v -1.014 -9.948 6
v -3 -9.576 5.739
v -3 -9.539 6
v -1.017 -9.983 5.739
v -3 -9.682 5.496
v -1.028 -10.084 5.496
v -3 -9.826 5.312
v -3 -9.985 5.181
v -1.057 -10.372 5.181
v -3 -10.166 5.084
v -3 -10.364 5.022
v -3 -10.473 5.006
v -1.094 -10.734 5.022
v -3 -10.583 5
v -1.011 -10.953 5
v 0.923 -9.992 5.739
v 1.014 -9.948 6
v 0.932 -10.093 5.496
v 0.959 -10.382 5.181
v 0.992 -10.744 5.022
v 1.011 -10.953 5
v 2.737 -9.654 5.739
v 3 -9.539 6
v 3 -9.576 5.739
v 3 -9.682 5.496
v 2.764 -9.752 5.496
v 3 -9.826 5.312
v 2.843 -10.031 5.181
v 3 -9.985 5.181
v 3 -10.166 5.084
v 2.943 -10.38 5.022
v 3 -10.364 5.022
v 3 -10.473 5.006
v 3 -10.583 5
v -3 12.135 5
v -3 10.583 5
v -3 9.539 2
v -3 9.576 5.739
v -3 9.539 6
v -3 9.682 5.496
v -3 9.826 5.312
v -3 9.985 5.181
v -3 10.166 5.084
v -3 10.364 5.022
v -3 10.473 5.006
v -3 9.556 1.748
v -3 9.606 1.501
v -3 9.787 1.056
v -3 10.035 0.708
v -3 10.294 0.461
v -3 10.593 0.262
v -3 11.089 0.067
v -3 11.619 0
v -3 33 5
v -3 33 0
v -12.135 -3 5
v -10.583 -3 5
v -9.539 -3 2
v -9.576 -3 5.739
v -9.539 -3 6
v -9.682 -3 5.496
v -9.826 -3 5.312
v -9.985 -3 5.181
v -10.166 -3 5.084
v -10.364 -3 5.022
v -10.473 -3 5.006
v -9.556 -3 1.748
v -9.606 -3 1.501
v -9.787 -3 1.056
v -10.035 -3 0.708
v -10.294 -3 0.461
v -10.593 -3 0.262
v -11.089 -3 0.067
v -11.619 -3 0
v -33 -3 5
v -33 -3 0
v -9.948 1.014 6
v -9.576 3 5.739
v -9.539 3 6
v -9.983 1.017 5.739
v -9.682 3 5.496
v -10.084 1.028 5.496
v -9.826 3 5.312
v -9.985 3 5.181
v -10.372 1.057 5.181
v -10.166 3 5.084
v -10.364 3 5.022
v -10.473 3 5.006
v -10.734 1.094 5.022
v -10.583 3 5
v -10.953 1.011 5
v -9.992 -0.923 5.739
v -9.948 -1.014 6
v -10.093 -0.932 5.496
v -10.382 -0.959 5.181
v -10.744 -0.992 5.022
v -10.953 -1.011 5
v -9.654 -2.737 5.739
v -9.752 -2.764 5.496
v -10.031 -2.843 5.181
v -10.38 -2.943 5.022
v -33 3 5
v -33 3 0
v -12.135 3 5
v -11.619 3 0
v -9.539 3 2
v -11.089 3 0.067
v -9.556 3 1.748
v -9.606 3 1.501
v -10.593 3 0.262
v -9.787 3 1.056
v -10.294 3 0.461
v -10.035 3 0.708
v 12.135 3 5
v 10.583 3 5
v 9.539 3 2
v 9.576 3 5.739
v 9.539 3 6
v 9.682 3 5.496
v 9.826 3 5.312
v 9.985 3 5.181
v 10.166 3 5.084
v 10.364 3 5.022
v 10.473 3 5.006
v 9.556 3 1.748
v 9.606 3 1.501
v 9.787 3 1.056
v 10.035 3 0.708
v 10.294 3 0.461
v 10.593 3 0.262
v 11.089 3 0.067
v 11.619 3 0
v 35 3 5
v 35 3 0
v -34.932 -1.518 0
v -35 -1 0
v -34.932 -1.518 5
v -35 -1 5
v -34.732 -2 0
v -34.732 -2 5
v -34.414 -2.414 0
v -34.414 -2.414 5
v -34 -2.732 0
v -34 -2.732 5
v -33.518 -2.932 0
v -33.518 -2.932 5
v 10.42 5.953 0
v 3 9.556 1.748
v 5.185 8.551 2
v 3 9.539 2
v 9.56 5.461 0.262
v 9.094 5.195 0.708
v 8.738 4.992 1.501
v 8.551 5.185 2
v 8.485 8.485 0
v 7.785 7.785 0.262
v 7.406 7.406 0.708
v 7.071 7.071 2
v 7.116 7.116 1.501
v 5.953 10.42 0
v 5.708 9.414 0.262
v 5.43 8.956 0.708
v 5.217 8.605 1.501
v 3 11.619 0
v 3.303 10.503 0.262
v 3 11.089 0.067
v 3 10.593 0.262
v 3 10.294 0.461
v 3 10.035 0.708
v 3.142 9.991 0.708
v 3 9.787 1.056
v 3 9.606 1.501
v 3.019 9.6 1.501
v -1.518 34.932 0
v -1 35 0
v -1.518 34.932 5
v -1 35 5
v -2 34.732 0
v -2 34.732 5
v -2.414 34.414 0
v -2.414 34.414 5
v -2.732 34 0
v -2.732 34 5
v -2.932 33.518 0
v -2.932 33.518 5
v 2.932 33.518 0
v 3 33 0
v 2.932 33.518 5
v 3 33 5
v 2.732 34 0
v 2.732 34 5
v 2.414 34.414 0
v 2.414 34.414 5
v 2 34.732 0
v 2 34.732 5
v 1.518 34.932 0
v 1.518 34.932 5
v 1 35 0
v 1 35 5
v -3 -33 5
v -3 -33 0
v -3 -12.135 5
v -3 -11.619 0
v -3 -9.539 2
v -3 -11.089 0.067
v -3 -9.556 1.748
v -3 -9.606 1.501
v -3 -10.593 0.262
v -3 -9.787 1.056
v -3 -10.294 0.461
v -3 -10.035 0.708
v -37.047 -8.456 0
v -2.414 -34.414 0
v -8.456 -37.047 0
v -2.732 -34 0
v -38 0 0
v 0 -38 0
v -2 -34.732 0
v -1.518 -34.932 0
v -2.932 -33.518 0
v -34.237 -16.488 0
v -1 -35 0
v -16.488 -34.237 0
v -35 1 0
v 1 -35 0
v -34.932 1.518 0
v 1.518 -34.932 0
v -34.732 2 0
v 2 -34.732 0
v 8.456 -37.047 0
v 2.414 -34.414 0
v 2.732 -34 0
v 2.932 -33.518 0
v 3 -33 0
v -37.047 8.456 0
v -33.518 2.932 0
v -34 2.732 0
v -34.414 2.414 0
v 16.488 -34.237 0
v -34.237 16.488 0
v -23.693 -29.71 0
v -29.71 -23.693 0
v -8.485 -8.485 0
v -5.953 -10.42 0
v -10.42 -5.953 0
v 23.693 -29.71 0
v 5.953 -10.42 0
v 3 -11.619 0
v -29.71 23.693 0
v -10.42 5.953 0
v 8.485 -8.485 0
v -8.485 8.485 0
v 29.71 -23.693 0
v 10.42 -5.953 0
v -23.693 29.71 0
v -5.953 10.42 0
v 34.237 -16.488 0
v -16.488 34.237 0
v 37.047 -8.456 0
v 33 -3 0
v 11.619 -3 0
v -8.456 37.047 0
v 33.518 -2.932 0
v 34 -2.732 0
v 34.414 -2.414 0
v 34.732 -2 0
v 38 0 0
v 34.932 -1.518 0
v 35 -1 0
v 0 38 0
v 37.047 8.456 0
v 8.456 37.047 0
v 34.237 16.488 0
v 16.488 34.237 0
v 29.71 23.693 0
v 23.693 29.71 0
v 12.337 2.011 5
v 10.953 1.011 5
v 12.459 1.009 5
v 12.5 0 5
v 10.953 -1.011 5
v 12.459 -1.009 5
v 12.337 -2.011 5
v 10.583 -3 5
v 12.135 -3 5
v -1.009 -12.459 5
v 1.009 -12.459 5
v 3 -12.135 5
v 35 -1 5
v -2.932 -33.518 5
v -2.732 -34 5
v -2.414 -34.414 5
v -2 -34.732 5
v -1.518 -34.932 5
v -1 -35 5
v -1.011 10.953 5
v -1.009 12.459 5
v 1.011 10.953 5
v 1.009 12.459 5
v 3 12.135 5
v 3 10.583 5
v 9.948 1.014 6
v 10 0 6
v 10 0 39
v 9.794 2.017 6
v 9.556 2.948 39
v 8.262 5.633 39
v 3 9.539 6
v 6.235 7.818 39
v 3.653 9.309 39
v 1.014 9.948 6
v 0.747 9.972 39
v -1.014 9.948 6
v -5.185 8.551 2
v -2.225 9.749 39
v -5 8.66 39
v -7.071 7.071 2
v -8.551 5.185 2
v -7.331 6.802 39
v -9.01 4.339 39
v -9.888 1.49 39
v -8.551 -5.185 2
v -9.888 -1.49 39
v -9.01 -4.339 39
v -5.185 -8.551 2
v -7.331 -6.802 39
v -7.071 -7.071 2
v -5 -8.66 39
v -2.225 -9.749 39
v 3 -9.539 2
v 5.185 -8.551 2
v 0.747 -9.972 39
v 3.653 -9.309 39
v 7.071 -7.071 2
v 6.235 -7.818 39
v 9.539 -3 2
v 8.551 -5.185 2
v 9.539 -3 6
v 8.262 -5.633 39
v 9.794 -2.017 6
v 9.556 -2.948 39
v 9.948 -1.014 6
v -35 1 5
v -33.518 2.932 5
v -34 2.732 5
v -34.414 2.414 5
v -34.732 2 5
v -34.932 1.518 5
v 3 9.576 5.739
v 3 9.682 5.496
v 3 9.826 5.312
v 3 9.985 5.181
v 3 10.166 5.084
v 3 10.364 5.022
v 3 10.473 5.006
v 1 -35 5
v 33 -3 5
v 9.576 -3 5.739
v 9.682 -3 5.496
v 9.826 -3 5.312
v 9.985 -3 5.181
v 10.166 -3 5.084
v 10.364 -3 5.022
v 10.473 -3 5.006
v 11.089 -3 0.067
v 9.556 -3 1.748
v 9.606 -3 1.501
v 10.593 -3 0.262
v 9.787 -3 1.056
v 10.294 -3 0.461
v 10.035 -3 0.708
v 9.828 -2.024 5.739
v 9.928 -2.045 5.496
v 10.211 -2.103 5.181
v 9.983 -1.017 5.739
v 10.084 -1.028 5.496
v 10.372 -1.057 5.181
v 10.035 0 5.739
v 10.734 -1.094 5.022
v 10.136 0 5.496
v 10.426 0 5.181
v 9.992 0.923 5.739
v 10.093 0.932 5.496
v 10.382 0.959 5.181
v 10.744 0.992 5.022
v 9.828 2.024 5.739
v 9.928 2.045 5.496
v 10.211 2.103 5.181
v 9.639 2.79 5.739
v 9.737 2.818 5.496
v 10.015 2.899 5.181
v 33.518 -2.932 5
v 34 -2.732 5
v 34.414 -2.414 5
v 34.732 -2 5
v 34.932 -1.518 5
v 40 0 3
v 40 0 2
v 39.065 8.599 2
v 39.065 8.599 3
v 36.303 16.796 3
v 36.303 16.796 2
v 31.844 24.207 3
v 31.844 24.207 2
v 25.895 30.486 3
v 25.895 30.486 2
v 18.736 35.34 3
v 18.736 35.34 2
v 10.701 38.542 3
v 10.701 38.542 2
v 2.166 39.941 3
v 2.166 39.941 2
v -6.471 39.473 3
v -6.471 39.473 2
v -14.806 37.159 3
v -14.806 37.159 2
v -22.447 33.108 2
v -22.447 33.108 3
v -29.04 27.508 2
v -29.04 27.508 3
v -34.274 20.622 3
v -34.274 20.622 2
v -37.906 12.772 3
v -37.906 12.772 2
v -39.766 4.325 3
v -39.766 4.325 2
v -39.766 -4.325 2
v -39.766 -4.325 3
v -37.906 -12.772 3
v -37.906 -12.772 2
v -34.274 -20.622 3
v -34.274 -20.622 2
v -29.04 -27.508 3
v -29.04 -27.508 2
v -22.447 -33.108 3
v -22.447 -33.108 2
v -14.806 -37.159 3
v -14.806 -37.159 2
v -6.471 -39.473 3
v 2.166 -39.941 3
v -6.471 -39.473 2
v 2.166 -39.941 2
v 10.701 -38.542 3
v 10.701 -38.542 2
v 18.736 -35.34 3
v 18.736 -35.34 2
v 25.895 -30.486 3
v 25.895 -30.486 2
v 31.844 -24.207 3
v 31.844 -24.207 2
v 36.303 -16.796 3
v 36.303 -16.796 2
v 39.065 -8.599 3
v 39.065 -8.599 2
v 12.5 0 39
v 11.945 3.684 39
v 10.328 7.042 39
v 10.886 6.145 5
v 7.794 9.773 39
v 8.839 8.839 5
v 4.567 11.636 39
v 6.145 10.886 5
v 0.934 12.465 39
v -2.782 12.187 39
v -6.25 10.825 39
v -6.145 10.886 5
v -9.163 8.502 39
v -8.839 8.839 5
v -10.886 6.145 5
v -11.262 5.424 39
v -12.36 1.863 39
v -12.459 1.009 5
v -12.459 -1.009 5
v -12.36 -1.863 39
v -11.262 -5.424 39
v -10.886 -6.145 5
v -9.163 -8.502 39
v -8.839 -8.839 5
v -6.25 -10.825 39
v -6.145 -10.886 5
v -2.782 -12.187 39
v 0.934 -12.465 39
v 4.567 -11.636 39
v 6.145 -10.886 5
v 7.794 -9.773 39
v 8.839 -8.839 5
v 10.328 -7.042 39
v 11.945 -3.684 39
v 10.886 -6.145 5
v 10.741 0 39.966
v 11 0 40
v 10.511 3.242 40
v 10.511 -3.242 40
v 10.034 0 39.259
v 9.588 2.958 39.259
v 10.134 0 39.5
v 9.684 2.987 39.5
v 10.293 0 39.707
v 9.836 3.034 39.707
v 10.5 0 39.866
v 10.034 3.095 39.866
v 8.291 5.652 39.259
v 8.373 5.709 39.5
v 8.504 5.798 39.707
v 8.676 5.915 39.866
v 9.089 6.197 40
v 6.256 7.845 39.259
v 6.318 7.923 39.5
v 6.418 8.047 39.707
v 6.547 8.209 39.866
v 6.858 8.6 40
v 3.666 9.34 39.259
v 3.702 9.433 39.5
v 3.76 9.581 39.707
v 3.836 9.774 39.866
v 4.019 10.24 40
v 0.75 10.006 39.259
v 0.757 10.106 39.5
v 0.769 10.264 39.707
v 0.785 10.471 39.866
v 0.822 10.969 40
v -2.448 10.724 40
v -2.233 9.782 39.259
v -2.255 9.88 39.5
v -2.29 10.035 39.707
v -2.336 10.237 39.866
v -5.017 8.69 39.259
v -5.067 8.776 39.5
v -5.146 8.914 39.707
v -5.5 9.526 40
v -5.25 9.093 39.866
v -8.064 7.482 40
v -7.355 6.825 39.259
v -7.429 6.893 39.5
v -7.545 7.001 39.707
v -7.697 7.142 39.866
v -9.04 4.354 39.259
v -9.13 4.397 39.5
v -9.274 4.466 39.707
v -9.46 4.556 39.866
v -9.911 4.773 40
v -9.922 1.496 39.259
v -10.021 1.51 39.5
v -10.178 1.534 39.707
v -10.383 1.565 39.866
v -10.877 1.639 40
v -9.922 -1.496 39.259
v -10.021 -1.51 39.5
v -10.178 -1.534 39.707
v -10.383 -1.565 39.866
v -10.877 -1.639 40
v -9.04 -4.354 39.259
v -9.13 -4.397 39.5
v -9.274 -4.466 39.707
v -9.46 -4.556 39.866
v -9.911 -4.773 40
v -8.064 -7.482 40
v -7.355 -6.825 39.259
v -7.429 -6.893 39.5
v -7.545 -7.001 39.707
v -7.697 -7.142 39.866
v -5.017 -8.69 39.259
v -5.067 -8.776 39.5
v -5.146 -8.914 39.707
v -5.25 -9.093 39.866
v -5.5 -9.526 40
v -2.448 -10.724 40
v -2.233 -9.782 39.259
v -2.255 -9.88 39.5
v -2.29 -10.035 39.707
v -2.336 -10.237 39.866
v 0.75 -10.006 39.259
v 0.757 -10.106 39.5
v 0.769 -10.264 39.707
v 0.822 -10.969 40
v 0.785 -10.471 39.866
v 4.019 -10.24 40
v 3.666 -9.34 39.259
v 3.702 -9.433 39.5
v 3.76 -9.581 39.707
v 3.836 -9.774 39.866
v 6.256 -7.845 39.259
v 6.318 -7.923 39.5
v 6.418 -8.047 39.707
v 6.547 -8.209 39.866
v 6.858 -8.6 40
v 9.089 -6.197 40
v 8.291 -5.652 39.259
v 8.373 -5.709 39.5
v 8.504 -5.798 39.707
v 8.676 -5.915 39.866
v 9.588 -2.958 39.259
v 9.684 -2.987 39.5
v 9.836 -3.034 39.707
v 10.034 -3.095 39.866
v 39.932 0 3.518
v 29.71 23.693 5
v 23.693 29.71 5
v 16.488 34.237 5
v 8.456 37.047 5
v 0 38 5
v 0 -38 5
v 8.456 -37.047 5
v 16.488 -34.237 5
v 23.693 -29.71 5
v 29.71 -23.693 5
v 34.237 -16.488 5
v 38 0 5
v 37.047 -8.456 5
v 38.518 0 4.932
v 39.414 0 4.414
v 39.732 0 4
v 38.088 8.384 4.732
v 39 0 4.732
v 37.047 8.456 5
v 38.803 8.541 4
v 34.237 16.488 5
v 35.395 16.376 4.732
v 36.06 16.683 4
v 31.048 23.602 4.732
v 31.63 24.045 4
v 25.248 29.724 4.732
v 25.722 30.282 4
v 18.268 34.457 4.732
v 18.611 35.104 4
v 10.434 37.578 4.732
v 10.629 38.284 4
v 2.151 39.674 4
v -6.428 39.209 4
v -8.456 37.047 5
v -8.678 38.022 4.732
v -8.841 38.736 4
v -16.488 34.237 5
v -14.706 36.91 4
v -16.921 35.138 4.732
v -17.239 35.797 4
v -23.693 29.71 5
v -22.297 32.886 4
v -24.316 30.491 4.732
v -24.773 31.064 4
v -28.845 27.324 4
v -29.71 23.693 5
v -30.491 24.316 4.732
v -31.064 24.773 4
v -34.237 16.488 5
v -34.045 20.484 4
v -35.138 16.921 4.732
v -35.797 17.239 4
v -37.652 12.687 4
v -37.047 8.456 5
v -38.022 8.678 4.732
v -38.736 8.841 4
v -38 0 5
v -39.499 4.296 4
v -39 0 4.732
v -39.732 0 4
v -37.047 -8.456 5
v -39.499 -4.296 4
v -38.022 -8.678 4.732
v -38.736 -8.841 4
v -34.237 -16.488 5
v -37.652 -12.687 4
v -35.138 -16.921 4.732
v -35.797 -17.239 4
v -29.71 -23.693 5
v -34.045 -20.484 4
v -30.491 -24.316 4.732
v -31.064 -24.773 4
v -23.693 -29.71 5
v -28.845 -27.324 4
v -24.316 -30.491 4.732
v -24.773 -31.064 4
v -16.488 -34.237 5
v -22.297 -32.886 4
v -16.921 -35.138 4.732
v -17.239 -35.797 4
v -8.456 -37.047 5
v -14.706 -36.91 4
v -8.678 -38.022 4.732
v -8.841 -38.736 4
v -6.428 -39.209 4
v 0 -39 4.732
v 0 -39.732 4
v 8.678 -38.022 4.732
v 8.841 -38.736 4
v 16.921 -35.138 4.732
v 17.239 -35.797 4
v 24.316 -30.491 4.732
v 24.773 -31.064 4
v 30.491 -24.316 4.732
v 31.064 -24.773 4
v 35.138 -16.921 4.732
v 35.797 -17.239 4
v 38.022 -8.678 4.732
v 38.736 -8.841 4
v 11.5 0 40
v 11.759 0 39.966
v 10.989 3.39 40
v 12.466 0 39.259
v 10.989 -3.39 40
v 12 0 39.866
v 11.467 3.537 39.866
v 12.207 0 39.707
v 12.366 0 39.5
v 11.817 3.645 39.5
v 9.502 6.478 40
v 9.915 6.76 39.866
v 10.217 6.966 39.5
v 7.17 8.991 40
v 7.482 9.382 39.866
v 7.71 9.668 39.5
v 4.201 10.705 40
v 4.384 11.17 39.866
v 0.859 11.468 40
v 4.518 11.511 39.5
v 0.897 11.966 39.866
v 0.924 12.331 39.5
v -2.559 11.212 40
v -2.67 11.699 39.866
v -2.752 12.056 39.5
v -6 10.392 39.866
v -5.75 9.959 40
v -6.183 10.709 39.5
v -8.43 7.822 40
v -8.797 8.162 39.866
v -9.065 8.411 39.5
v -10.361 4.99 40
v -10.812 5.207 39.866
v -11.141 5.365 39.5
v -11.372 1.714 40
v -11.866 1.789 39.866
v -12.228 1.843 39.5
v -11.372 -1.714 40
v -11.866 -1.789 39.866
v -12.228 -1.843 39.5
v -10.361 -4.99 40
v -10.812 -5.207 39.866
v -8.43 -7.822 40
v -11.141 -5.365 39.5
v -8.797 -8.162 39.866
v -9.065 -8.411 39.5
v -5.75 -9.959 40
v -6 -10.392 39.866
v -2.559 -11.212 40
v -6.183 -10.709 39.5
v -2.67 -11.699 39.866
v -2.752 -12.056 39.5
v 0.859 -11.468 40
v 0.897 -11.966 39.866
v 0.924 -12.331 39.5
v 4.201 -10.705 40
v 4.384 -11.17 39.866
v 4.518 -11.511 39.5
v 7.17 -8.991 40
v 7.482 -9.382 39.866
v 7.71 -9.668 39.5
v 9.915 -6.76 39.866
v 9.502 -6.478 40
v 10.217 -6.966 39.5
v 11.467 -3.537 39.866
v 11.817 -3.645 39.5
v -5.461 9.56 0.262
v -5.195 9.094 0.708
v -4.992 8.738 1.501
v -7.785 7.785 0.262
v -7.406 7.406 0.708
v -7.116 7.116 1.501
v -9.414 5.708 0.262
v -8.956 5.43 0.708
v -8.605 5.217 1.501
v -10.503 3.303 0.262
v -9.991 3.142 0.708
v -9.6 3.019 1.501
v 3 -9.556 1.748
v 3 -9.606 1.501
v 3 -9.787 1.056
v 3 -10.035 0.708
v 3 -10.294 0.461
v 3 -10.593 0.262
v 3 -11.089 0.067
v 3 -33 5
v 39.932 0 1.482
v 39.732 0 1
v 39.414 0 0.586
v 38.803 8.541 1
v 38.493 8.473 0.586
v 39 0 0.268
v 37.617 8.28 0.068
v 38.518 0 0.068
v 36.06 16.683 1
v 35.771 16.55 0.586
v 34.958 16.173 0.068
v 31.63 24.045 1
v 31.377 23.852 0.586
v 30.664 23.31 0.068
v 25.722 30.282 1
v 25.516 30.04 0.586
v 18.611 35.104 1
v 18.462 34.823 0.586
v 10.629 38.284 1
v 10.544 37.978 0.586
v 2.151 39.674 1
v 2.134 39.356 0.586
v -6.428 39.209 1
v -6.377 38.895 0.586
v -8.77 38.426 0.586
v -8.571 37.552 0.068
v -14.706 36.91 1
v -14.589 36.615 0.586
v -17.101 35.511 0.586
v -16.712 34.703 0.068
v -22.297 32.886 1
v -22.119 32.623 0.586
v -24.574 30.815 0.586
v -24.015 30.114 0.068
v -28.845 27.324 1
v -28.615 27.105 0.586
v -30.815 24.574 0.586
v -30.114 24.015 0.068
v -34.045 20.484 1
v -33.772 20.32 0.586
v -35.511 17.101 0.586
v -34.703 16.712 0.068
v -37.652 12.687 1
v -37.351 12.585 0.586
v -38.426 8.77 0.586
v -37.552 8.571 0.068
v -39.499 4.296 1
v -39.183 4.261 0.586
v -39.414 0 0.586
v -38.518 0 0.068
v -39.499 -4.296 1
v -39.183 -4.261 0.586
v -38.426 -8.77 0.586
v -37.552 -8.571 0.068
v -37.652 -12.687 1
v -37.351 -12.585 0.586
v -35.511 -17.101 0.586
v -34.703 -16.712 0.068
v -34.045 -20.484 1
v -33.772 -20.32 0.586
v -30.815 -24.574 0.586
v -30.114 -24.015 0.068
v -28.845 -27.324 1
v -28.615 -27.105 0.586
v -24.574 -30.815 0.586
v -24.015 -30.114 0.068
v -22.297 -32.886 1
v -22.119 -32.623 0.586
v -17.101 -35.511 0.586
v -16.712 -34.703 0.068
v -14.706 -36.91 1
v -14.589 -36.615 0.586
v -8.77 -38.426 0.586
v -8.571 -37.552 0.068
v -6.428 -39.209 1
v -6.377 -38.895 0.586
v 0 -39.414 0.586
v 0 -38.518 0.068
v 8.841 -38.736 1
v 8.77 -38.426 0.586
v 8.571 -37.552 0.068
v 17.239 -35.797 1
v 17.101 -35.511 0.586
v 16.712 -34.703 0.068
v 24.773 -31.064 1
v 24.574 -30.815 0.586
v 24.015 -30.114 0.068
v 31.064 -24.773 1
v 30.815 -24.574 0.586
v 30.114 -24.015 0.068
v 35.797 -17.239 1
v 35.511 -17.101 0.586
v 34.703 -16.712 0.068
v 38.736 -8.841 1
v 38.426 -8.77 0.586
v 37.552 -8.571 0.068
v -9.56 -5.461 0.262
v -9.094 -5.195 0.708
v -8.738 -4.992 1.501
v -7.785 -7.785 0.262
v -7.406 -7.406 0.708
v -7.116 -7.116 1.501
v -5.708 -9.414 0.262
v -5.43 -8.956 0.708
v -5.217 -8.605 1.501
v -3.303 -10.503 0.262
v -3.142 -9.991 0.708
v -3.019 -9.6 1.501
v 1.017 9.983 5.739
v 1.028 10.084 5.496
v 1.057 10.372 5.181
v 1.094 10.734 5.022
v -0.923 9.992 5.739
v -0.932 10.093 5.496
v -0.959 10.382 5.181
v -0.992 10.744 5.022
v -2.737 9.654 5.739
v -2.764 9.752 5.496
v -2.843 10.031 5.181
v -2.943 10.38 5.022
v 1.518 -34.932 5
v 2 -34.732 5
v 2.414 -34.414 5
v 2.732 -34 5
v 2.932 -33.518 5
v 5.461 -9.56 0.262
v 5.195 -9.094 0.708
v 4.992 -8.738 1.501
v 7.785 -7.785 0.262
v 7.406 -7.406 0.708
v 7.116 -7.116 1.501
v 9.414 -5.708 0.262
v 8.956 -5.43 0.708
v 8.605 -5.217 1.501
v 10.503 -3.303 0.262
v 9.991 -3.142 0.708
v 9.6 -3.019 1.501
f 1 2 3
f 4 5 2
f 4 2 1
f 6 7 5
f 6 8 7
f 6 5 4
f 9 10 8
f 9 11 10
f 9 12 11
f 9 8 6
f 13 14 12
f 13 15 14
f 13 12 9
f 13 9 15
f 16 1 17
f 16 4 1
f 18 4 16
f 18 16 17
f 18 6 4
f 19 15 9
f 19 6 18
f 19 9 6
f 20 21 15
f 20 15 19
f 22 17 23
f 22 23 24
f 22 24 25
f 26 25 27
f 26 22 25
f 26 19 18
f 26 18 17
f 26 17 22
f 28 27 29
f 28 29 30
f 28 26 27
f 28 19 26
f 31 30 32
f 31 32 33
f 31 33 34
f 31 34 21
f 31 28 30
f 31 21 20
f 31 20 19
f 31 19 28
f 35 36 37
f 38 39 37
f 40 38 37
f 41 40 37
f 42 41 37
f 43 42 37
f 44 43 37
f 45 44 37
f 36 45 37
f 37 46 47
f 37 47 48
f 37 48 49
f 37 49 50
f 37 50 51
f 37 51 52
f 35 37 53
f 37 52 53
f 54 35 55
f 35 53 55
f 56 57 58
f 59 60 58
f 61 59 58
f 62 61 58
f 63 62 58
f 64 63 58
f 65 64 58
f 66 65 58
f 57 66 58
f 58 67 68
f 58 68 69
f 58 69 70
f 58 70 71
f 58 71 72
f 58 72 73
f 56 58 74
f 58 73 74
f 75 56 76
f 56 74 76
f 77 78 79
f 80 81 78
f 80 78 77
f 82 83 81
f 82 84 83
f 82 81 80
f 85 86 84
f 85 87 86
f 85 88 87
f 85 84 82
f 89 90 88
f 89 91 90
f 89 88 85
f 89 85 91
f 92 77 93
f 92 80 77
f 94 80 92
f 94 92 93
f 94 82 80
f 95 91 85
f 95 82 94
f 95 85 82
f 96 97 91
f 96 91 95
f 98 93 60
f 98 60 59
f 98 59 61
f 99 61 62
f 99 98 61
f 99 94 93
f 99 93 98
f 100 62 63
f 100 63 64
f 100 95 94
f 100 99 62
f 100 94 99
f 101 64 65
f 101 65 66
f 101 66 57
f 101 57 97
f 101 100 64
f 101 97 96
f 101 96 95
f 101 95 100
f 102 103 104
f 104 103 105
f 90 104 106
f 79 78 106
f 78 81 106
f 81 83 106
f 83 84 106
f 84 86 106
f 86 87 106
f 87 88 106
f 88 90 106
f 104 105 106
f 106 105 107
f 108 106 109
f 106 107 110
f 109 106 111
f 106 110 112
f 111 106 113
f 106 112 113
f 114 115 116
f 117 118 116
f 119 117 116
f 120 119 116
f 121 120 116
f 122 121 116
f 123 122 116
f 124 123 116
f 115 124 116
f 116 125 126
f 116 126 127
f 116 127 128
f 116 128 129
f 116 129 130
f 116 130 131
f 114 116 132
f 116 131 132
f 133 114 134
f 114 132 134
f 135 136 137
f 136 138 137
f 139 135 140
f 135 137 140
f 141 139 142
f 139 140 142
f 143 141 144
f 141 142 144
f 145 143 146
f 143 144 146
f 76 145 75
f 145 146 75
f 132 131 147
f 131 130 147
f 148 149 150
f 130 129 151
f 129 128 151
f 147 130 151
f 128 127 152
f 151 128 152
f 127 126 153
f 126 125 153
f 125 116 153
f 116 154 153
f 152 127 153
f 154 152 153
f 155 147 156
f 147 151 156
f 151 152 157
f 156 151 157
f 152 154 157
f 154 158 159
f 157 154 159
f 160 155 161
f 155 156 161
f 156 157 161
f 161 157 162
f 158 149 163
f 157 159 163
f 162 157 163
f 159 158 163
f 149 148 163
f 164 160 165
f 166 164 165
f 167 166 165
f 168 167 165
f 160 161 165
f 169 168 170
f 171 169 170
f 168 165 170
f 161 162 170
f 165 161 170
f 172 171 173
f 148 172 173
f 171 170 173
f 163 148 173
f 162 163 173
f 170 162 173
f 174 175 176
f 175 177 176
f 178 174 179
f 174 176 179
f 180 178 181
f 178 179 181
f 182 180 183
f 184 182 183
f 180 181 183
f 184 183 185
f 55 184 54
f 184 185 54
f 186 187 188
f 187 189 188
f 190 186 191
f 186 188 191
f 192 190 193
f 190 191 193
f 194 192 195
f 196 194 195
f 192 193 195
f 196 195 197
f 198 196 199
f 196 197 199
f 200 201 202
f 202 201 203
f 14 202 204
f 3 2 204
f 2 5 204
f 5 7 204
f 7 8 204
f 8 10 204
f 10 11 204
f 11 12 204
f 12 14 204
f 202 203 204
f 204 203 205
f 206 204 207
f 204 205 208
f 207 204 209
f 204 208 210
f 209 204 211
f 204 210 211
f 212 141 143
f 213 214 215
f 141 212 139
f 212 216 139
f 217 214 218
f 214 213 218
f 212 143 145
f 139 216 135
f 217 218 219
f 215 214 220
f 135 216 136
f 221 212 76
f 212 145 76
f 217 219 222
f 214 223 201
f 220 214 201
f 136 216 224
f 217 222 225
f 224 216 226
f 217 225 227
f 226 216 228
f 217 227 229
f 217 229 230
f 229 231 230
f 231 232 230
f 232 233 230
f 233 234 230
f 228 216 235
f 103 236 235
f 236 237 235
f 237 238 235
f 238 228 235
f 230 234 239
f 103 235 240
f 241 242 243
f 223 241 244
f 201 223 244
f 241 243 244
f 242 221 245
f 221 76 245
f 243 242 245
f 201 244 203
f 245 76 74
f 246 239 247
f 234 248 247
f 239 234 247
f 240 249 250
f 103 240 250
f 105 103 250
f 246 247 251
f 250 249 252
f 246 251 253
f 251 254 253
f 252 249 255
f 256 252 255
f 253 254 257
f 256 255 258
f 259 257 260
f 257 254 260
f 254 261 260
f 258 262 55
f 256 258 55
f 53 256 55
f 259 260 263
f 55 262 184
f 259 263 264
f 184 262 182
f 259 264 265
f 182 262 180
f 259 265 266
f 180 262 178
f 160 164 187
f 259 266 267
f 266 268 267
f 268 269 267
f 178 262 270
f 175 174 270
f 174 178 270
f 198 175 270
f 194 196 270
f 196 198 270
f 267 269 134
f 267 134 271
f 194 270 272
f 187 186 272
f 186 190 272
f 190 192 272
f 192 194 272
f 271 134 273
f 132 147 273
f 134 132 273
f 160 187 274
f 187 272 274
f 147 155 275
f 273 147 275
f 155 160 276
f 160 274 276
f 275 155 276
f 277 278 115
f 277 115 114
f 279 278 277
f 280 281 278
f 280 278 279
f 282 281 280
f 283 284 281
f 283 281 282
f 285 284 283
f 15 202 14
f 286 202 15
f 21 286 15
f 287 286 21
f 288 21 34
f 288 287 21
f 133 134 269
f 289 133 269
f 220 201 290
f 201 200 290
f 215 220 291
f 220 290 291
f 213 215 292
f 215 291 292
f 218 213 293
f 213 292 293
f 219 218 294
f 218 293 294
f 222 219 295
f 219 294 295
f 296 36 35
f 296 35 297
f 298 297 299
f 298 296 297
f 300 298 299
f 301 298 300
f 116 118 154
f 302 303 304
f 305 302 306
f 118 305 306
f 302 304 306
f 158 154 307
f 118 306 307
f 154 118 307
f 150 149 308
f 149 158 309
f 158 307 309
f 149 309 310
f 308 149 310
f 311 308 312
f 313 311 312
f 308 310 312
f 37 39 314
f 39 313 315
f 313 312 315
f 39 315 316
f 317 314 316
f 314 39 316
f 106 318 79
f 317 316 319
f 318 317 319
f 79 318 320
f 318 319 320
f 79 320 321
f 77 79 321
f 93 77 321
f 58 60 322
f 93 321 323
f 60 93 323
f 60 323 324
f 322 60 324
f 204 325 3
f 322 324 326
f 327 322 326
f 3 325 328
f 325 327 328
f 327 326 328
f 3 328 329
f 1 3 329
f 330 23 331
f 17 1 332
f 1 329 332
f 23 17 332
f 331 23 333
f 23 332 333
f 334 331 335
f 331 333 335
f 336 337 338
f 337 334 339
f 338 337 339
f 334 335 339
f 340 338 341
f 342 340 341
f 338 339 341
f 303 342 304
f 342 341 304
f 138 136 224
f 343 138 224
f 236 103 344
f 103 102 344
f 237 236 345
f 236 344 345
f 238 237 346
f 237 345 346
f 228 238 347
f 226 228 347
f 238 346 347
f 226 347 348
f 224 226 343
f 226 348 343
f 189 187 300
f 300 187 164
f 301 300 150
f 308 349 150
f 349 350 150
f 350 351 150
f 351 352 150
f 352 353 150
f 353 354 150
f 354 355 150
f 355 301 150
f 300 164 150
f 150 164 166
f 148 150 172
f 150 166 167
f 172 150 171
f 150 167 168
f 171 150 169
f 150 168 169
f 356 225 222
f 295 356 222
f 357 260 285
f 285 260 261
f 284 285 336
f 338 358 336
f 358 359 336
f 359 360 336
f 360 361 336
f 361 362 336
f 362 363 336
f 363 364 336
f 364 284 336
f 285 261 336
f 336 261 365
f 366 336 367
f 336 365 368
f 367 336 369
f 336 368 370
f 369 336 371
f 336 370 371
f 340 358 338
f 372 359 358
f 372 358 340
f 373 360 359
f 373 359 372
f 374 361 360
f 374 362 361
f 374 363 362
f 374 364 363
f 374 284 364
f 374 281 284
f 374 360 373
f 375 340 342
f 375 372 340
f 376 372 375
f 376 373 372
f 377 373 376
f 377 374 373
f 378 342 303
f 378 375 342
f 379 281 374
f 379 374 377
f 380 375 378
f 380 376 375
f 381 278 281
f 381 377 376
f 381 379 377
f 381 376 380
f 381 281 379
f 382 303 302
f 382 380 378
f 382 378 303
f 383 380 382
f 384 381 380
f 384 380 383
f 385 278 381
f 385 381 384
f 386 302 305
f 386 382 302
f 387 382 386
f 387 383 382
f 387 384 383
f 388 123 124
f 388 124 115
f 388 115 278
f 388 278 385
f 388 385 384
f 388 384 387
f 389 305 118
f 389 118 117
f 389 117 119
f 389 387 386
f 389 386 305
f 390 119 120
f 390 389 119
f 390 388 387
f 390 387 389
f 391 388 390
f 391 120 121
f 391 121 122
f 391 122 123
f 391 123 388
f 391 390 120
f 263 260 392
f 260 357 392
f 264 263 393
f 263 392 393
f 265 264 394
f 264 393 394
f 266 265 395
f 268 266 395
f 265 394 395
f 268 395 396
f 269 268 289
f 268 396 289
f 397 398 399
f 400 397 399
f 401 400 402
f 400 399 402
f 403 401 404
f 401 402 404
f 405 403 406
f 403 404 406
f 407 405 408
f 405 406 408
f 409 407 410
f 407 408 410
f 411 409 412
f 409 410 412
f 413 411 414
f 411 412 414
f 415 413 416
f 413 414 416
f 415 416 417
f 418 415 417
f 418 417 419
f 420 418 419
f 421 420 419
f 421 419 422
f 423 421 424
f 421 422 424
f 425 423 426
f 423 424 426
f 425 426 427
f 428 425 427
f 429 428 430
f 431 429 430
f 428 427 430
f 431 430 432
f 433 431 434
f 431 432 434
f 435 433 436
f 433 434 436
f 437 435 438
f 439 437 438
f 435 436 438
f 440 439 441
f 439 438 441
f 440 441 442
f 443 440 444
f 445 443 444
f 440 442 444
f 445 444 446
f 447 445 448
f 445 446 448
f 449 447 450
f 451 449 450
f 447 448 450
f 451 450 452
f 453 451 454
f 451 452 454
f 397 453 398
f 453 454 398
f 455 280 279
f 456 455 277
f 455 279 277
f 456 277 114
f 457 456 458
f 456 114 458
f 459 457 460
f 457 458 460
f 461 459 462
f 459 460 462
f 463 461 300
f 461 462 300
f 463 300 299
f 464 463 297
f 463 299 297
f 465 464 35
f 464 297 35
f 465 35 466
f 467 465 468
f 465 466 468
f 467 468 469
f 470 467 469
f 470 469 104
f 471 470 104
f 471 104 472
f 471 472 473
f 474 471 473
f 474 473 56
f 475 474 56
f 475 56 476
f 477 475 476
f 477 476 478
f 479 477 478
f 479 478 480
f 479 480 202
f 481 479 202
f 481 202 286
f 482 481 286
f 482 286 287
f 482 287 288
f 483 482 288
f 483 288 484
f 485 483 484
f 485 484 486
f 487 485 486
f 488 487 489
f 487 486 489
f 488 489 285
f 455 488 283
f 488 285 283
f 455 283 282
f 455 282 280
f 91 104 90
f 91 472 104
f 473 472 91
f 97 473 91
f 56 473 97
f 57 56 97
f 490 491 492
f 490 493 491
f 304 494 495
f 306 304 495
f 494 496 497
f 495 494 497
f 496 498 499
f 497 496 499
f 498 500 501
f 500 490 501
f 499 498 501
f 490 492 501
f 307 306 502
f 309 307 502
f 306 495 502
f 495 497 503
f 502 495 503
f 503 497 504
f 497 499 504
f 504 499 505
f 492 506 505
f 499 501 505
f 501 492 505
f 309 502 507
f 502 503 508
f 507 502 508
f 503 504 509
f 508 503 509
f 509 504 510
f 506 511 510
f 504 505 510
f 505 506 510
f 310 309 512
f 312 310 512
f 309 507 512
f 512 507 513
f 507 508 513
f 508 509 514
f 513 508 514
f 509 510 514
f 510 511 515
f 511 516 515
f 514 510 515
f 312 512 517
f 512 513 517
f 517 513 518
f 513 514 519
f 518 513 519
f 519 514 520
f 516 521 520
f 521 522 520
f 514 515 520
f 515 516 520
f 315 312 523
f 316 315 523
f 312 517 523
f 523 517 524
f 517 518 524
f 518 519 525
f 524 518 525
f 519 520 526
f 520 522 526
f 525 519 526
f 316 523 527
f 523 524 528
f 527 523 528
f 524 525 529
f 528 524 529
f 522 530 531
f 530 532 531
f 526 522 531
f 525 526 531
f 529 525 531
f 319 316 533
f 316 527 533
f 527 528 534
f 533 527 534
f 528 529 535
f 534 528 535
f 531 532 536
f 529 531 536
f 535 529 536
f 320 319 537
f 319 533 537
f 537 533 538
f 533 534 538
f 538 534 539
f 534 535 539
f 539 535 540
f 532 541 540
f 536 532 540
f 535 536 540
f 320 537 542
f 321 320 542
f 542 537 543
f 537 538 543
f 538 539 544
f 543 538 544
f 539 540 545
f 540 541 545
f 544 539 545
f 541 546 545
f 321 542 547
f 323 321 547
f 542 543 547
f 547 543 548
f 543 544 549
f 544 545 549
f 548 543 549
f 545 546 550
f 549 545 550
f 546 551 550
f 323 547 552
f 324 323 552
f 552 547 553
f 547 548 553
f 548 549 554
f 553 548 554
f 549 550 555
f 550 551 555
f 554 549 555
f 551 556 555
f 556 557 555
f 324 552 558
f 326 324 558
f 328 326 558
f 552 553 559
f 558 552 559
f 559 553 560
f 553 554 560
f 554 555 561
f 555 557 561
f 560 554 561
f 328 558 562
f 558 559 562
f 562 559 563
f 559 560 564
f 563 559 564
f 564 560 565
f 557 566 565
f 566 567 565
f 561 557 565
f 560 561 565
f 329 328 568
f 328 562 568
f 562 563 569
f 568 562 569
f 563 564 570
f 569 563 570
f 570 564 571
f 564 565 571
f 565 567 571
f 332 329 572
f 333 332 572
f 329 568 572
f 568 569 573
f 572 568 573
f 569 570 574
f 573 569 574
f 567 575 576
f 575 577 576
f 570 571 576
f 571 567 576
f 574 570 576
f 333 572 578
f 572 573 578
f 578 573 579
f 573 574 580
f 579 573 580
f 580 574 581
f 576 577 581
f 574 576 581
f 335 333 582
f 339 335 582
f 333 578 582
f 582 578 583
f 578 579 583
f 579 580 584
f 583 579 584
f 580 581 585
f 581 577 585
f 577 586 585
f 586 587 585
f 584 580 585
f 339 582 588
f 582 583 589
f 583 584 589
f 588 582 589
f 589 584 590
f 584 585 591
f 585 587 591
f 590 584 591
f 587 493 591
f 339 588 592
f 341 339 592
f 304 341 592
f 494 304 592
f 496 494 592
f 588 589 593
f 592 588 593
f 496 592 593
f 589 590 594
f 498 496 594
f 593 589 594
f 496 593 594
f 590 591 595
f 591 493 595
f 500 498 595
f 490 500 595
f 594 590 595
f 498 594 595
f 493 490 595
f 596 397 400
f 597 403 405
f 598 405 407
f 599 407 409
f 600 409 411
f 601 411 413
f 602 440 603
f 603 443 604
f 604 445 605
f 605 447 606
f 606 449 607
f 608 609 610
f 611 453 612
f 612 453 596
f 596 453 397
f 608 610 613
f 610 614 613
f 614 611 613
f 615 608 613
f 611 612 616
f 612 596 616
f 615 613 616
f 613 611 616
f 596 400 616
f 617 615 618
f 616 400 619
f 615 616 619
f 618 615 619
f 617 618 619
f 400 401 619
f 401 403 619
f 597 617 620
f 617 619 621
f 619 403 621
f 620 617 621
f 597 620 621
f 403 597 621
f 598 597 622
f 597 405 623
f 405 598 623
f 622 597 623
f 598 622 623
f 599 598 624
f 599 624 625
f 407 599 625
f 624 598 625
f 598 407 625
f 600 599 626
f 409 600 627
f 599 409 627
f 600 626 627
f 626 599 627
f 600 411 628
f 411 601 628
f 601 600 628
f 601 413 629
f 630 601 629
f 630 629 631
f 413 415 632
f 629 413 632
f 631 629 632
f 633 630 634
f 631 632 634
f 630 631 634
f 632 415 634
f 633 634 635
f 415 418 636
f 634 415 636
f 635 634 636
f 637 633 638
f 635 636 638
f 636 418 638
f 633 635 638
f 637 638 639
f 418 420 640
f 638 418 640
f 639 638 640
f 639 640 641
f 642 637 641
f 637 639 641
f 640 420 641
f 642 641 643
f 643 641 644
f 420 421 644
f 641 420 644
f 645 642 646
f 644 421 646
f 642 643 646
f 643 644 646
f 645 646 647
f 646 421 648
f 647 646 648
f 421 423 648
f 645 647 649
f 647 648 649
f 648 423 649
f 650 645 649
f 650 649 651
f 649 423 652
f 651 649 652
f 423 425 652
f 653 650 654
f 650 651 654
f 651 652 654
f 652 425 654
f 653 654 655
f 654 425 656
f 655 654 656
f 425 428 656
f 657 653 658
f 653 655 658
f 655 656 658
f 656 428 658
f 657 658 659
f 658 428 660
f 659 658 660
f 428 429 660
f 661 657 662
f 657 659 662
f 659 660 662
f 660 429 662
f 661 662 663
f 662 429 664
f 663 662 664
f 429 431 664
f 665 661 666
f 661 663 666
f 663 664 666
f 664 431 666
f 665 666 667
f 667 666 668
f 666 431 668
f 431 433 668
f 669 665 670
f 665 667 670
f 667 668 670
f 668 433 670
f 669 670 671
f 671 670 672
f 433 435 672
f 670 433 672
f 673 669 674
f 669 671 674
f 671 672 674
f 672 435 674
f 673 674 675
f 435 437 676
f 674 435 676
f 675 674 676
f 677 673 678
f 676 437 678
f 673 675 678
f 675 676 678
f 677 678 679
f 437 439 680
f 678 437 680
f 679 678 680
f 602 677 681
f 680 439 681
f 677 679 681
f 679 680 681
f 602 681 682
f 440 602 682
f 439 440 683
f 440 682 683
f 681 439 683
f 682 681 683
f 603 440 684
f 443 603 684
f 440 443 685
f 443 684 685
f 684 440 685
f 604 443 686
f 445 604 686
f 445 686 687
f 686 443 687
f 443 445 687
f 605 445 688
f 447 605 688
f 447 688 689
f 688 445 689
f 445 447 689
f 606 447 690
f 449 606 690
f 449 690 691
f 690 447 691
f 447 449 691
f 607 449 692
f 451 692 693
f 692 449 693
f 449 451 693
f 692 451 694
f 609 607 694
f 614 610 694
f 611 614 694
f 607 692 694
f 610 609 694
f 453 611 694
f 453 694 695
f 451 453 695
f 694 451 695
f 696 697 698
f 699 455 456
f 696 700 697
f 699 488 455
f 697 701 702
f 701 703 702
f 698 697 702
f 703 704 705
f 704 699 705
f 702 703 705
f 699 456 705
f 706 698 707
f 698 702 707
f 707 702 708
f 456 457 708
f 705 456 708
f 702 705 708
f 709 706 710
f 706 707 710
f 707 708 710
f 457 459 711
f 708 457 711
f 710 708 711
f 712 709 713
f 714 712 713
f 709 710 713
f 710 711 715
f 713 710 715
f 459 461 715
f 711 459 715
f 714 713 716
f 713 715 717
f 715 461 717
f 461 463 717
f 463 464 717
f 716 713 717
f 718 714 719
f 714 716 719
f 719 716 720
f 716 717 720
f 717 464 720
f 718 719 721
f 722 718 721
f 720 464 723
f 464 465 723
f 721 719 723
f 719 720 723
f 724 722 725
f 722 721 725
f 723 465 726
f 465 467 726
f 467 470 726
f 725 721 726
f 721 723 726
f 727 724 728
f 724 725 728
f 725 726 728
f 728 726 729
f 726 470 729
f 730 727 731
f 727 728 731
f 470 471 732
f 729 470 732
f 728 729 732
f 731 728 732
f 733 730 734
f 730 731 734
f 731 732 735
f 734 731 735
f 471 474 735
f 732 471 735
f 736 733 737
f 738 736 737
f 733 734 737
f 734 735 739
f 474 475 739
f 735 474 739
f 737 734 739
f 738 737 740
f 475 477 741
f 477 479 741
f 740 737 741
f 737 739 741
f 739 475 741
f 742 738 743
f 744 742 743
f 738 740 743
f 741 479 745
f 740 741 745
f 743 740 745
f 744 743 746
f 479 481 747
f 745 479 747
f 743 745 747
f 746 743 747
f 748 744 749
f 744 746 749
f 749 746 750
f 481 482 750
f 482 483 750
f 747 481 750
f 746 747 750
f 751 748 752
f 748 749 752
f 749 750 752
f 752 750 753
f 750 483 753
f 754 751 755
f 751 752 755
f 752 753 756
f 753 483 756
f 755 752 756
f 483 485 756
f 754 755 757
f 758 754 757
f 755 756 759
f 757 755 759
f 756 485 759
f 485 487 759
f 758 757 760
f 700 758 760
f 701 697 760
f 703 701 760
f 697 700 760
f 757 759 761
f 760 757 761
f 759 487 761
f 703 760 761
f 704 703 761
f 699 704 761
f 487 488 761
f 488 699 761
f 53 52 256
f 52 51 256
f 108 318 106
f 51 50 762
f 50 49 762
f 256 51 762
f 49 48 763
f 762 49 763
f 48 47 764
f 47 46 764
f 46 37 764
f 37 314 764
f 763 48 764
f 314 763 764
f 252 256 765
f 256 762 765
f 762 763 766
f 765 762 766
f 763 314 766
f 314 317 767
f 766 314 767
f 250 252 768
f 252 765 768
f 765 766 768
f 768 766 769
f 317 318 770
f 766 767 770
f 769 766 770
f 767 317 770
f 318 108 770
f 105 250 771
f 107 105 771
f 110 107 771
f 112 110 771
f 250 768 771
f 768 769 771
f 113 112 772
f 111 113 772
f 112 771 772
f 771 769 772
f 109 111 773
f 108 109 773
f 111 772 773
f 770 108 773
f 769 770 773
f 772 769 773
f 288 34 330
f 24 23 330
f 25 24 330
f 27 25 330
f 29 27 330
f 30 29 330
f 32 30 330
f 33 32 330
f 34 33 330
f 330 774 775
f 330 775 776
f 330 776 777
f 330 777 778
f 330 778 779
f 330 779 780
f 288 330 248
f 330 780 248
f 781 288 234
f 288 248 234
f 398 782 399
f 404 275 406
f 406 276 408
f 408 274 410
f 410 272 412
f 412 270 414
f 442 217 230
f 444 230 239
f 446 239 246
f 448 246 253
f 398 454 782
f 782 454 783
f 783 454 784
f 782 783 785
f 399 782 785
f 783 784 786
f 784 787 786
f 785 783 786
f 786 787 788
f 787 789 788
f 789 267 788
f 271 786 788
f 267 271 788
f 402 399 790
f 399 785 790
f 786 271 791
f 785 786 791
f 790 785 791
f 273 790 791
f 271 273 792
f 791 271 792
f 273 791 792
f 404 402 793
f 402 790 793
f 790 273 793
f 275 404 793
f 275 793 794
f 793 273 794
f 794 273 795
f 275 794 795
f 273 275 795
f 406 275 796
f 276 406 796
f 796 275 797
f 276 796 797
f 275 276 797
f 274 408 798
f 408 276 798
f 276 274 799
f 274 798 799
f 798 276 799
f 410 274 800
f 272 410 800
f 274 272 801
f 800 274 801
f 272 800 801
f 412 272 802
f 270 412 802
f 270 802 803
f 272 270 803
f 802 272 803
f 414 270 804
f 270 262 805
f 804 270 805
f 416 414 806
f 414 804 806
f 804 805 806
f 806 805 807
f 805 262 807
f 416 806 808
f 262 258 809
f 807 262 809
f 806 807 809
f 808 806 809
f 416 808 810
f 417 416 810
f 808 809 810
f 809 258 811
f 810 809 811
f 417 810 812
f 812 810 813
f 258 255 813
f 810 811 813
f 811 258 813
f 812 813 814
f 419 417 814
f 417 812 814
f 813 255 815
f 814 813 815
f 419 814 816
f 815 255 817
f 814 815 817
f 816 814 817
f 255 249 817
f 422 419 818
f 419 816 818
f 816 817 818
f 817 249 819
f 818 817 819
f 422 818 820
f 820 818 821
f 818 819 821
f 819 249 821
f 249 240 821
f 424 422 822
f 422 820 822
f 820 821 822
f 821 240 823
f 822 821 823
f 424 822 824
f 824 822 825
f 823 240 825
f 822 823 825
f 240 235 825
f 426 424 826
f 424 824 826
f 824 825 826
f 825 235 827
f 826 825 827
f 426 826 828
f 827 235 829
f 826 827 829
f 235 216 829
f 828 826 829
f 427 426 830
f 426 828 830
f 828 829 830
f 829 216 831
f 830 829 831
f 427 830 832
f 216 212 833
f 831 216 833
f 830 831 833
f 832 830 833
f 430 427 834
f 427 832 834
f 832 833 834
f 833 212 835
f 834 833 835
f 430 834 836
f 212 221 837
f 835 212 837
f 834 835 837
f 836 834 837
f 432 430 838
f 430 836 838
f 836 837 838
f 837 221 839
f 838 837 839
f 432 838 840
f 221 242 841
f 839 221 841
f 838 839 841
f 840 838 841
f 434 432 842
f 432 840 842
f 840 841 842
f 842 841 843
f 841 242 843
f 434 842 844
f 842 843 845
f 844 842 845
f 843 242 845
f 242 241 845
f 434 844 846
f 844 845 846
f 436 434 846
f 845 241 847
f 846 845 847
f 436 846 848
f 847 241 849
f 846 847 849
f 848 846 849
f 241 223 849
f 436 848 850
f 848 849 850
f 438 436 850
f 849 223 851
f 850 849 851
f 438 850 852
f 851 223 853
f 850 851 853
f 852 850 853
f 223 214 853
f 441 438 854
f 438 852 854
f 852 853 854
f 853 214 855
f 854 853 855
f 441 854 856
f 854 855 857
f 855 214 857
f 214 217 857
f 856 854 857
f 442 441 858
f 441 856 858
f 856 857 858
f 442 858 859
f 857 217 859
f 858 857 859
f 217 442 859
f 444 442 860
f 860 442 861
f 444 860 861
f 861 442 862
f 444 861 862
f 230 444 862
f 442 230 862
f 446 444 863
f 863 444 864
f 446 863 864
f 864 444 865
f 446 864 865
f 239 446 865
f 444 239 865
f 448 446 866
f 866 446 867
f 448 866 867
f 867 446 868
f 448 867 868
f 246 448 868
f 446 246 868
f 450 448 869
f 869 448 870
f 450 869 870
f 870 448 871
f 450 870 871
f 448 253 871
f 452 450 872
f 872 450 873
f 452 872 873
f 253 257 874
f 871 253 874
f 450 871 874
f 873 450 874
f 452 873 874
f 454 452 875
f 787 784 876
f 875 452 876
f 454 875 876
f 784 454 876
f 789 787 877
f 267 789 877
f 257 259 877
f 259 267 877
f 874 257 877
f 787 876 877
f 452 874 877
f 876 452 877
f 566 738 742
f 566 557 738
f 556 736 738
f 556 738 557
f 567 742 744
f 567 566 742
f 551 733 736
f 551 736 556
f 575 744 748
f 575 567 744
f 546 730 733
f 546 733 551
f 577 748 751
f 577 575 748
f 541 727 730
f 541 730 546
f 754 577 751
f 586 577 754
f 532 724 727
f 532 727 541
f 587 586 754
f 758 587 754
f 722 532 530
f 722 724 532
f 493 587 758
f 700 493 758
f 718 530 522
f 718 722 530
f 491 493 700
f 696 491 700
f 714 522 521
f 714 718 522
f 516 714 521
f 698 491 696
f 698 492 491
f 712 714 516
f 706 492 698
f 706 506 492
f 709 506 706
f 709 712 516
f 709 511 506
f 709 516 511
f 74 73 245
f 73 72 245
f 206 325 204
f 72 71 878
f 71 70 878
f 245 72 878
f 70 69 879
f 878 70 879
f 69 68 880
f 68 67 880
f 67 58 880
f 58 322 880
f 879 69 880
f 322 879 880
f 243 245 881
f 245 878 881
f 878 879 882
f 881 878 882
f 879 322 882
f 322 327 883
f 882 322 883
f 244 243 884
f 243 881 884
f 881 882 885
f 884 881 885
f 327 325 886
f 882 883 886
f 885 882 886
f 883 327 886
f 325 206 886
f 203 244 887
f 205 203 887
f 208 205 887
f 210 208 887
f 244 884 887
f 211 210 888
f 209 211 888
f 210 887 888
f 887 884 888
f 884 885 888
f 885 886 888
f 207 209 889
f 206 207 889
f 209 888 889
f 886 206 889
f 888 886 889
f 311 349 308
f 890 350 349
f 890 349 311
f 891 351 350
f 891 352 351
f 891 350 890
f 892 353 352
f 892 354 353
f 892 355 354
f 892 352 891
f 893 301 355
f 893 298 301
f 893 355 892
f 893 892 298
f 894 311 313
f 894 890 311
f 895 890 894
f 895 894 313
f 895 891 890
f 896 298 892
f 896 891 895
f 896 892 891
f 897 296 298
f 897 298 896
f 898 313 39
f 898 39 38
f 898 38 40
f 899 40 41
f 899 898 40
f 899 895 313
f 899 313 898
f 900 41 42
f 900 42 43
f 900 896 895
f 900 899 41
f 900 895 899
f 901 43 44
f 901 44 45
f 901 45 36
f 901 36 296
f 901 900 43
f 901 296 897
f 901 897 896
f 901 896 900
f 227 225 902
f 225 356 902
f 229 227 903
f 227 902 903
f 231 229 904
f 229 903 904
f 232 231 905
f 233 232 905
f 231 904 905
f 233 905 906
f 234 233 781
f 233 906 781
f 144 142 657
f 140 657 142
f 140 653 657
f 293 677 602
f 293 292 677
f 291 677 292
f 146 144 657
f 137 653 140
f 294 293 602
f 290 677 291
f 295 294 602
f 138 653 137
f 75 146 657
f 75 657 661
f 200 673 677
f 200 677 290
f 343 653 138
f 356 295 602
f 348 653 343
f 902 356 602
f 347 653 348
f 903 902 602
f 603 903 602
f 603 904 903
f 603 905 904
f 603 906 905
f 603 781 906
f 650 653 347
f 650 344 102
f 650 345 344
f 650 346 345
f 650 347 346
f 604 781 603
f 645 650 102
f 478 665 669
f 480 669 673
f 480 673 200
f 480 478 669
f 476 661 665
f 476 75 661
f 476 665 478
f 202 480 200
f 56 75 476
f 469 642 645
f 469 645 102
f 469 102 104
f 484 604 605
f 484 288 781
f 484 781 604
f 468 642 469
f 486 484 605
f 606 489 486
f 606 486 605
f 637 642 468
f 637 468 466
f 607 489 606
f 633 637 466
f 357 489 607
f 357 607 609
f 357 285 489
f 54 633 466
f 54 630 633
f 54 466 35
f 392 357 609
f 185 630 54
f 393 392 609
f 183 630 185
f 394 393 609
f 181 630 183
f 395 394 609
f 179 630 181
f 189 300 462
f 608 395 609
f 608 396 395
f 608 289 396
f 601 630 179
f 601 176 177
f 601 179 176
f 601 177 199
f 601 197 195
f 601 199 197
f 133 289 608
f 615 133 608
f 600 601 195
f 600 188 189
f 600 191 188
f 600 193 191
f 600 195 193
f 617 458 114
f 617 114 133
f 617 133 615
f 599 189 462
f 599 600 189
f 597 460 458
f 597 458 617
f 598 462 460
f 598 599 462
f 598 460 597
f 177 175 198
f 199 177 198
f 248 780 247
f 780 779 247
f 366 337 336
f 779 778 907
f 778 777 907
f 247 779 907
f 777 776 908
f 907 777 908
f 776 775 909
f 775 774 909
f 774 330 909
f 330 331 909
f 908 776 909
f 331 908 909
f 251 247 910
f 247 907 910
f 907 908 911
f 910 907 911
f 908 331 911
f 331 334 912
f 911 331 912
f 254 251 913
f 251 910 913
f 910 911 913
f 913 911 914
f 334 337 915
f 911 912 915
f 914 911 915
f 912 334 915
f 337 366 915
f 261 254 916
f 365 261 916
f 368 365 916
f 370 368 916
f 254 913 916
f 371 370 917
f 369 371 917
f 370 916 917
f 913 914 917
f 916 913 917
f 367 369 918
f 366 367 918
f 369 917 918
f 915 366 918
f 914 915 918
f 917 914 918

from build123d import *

# Parameters (mm, degrees)
SKETCH_R        = 40
PAD_DEPTH       = 5
SKETCH001_R     = 12.5
PAD001_DEPTH    = 35
SKETCH002_R     = 10
POCKET_DEPTH    = 40.001
POCKET001_DEPTH = 5
FILLET_R        = 2
FILLET001_R     = 2
FILLET002_R     = 1
FILLET003_R     = 2


with BuildPart() as part:
    # Sketch → Pad (new body)
    with BuildSketch(Plane.XY):
        Circle(SKETCH_R)
    extrude(amount=PAD_DEPTH)

    # Sketch001 (on Face3 of Pad) → Pad001 (join)
    with BuildSketch(Plane.XY.offset(5)):
        Circle(SKETCH001_R)
    extrude(amount=PAD001_DEPTH)

    # Sketch002 (on Face5 of Pad001) → Pocket (cut, through all)
    with BuildSketch(Plane.XY.offset(40)):
        Circle(SKETCH002_R)
    extrude(amount=-POCKET_DEPTH, mode=Mode.SUBTRACT)

    # Sketch003 (on Face2 of Pocket) → Pocket001 (cut)
    with BuildSketch(Plane(origin=(0, 0, 0), x_dir=(1, 0, 0), z_dir=(0, 0, -1))):
        Polygon((-3, 35), (-3, 3), (-35, 3), (-35, -3), (-3, -3), (-3, -35), (3, -35), (3, -3), (35, -3), (35, 3), (3, 3), (3, 35), align=None)
    extrude(amount=-POCKET001_DEPTH, mode=Mode.SUBTRACT)

    # Fillet
    fillet_edges = [part.edges().sort_by_distance(p)[0] for p in [
        (-3, -35, 2.5),
        (3, -35, 2.5),
        (35, -3, 2.5),
        (-35, -3, 2.5),
        (-35, 3, 2.5),
        (-3, 35, 2.5),
        (3, 35, 2.5),
    ]]
    fillet(fillet_edges, radius=FILLET_R)

    # Fillet001
    fillet001_edges = [part.edges().sort_by_distance(p)[0] for p in [
        (7.071068, -7.071068, 0),
        (7.071068, 7.071068, 0),
        (-7.071068, 7.071068, 0),
        (-7.071068, -7.071068, 0),
    ]]
    fillet(fillet001_edges, radius=FILLET001_R)

    # Fillet002
    fillet002_edges = [part.edges().sort_by_distance(p)[0] for p in [
        (-12.5, 0, 40),
        (-10, 0, 40),
        (0, -10, 5),
        (9.884177, -1.517577, 5),
        (0, 10, 5),
        (-10, 0, 5),
    ]]
    fillet(fillet002_edges, radius=FILLET002_R)

    # Fillet003
    fillet003_edges = [part.edges().sort_by_distance(p)[0] for p in [
        (-40, 0, 5),
        (-40, 0, 0),
    ]]
    fillet(fillet003_edges, radius=FILLET003_R)


solid = part.part
